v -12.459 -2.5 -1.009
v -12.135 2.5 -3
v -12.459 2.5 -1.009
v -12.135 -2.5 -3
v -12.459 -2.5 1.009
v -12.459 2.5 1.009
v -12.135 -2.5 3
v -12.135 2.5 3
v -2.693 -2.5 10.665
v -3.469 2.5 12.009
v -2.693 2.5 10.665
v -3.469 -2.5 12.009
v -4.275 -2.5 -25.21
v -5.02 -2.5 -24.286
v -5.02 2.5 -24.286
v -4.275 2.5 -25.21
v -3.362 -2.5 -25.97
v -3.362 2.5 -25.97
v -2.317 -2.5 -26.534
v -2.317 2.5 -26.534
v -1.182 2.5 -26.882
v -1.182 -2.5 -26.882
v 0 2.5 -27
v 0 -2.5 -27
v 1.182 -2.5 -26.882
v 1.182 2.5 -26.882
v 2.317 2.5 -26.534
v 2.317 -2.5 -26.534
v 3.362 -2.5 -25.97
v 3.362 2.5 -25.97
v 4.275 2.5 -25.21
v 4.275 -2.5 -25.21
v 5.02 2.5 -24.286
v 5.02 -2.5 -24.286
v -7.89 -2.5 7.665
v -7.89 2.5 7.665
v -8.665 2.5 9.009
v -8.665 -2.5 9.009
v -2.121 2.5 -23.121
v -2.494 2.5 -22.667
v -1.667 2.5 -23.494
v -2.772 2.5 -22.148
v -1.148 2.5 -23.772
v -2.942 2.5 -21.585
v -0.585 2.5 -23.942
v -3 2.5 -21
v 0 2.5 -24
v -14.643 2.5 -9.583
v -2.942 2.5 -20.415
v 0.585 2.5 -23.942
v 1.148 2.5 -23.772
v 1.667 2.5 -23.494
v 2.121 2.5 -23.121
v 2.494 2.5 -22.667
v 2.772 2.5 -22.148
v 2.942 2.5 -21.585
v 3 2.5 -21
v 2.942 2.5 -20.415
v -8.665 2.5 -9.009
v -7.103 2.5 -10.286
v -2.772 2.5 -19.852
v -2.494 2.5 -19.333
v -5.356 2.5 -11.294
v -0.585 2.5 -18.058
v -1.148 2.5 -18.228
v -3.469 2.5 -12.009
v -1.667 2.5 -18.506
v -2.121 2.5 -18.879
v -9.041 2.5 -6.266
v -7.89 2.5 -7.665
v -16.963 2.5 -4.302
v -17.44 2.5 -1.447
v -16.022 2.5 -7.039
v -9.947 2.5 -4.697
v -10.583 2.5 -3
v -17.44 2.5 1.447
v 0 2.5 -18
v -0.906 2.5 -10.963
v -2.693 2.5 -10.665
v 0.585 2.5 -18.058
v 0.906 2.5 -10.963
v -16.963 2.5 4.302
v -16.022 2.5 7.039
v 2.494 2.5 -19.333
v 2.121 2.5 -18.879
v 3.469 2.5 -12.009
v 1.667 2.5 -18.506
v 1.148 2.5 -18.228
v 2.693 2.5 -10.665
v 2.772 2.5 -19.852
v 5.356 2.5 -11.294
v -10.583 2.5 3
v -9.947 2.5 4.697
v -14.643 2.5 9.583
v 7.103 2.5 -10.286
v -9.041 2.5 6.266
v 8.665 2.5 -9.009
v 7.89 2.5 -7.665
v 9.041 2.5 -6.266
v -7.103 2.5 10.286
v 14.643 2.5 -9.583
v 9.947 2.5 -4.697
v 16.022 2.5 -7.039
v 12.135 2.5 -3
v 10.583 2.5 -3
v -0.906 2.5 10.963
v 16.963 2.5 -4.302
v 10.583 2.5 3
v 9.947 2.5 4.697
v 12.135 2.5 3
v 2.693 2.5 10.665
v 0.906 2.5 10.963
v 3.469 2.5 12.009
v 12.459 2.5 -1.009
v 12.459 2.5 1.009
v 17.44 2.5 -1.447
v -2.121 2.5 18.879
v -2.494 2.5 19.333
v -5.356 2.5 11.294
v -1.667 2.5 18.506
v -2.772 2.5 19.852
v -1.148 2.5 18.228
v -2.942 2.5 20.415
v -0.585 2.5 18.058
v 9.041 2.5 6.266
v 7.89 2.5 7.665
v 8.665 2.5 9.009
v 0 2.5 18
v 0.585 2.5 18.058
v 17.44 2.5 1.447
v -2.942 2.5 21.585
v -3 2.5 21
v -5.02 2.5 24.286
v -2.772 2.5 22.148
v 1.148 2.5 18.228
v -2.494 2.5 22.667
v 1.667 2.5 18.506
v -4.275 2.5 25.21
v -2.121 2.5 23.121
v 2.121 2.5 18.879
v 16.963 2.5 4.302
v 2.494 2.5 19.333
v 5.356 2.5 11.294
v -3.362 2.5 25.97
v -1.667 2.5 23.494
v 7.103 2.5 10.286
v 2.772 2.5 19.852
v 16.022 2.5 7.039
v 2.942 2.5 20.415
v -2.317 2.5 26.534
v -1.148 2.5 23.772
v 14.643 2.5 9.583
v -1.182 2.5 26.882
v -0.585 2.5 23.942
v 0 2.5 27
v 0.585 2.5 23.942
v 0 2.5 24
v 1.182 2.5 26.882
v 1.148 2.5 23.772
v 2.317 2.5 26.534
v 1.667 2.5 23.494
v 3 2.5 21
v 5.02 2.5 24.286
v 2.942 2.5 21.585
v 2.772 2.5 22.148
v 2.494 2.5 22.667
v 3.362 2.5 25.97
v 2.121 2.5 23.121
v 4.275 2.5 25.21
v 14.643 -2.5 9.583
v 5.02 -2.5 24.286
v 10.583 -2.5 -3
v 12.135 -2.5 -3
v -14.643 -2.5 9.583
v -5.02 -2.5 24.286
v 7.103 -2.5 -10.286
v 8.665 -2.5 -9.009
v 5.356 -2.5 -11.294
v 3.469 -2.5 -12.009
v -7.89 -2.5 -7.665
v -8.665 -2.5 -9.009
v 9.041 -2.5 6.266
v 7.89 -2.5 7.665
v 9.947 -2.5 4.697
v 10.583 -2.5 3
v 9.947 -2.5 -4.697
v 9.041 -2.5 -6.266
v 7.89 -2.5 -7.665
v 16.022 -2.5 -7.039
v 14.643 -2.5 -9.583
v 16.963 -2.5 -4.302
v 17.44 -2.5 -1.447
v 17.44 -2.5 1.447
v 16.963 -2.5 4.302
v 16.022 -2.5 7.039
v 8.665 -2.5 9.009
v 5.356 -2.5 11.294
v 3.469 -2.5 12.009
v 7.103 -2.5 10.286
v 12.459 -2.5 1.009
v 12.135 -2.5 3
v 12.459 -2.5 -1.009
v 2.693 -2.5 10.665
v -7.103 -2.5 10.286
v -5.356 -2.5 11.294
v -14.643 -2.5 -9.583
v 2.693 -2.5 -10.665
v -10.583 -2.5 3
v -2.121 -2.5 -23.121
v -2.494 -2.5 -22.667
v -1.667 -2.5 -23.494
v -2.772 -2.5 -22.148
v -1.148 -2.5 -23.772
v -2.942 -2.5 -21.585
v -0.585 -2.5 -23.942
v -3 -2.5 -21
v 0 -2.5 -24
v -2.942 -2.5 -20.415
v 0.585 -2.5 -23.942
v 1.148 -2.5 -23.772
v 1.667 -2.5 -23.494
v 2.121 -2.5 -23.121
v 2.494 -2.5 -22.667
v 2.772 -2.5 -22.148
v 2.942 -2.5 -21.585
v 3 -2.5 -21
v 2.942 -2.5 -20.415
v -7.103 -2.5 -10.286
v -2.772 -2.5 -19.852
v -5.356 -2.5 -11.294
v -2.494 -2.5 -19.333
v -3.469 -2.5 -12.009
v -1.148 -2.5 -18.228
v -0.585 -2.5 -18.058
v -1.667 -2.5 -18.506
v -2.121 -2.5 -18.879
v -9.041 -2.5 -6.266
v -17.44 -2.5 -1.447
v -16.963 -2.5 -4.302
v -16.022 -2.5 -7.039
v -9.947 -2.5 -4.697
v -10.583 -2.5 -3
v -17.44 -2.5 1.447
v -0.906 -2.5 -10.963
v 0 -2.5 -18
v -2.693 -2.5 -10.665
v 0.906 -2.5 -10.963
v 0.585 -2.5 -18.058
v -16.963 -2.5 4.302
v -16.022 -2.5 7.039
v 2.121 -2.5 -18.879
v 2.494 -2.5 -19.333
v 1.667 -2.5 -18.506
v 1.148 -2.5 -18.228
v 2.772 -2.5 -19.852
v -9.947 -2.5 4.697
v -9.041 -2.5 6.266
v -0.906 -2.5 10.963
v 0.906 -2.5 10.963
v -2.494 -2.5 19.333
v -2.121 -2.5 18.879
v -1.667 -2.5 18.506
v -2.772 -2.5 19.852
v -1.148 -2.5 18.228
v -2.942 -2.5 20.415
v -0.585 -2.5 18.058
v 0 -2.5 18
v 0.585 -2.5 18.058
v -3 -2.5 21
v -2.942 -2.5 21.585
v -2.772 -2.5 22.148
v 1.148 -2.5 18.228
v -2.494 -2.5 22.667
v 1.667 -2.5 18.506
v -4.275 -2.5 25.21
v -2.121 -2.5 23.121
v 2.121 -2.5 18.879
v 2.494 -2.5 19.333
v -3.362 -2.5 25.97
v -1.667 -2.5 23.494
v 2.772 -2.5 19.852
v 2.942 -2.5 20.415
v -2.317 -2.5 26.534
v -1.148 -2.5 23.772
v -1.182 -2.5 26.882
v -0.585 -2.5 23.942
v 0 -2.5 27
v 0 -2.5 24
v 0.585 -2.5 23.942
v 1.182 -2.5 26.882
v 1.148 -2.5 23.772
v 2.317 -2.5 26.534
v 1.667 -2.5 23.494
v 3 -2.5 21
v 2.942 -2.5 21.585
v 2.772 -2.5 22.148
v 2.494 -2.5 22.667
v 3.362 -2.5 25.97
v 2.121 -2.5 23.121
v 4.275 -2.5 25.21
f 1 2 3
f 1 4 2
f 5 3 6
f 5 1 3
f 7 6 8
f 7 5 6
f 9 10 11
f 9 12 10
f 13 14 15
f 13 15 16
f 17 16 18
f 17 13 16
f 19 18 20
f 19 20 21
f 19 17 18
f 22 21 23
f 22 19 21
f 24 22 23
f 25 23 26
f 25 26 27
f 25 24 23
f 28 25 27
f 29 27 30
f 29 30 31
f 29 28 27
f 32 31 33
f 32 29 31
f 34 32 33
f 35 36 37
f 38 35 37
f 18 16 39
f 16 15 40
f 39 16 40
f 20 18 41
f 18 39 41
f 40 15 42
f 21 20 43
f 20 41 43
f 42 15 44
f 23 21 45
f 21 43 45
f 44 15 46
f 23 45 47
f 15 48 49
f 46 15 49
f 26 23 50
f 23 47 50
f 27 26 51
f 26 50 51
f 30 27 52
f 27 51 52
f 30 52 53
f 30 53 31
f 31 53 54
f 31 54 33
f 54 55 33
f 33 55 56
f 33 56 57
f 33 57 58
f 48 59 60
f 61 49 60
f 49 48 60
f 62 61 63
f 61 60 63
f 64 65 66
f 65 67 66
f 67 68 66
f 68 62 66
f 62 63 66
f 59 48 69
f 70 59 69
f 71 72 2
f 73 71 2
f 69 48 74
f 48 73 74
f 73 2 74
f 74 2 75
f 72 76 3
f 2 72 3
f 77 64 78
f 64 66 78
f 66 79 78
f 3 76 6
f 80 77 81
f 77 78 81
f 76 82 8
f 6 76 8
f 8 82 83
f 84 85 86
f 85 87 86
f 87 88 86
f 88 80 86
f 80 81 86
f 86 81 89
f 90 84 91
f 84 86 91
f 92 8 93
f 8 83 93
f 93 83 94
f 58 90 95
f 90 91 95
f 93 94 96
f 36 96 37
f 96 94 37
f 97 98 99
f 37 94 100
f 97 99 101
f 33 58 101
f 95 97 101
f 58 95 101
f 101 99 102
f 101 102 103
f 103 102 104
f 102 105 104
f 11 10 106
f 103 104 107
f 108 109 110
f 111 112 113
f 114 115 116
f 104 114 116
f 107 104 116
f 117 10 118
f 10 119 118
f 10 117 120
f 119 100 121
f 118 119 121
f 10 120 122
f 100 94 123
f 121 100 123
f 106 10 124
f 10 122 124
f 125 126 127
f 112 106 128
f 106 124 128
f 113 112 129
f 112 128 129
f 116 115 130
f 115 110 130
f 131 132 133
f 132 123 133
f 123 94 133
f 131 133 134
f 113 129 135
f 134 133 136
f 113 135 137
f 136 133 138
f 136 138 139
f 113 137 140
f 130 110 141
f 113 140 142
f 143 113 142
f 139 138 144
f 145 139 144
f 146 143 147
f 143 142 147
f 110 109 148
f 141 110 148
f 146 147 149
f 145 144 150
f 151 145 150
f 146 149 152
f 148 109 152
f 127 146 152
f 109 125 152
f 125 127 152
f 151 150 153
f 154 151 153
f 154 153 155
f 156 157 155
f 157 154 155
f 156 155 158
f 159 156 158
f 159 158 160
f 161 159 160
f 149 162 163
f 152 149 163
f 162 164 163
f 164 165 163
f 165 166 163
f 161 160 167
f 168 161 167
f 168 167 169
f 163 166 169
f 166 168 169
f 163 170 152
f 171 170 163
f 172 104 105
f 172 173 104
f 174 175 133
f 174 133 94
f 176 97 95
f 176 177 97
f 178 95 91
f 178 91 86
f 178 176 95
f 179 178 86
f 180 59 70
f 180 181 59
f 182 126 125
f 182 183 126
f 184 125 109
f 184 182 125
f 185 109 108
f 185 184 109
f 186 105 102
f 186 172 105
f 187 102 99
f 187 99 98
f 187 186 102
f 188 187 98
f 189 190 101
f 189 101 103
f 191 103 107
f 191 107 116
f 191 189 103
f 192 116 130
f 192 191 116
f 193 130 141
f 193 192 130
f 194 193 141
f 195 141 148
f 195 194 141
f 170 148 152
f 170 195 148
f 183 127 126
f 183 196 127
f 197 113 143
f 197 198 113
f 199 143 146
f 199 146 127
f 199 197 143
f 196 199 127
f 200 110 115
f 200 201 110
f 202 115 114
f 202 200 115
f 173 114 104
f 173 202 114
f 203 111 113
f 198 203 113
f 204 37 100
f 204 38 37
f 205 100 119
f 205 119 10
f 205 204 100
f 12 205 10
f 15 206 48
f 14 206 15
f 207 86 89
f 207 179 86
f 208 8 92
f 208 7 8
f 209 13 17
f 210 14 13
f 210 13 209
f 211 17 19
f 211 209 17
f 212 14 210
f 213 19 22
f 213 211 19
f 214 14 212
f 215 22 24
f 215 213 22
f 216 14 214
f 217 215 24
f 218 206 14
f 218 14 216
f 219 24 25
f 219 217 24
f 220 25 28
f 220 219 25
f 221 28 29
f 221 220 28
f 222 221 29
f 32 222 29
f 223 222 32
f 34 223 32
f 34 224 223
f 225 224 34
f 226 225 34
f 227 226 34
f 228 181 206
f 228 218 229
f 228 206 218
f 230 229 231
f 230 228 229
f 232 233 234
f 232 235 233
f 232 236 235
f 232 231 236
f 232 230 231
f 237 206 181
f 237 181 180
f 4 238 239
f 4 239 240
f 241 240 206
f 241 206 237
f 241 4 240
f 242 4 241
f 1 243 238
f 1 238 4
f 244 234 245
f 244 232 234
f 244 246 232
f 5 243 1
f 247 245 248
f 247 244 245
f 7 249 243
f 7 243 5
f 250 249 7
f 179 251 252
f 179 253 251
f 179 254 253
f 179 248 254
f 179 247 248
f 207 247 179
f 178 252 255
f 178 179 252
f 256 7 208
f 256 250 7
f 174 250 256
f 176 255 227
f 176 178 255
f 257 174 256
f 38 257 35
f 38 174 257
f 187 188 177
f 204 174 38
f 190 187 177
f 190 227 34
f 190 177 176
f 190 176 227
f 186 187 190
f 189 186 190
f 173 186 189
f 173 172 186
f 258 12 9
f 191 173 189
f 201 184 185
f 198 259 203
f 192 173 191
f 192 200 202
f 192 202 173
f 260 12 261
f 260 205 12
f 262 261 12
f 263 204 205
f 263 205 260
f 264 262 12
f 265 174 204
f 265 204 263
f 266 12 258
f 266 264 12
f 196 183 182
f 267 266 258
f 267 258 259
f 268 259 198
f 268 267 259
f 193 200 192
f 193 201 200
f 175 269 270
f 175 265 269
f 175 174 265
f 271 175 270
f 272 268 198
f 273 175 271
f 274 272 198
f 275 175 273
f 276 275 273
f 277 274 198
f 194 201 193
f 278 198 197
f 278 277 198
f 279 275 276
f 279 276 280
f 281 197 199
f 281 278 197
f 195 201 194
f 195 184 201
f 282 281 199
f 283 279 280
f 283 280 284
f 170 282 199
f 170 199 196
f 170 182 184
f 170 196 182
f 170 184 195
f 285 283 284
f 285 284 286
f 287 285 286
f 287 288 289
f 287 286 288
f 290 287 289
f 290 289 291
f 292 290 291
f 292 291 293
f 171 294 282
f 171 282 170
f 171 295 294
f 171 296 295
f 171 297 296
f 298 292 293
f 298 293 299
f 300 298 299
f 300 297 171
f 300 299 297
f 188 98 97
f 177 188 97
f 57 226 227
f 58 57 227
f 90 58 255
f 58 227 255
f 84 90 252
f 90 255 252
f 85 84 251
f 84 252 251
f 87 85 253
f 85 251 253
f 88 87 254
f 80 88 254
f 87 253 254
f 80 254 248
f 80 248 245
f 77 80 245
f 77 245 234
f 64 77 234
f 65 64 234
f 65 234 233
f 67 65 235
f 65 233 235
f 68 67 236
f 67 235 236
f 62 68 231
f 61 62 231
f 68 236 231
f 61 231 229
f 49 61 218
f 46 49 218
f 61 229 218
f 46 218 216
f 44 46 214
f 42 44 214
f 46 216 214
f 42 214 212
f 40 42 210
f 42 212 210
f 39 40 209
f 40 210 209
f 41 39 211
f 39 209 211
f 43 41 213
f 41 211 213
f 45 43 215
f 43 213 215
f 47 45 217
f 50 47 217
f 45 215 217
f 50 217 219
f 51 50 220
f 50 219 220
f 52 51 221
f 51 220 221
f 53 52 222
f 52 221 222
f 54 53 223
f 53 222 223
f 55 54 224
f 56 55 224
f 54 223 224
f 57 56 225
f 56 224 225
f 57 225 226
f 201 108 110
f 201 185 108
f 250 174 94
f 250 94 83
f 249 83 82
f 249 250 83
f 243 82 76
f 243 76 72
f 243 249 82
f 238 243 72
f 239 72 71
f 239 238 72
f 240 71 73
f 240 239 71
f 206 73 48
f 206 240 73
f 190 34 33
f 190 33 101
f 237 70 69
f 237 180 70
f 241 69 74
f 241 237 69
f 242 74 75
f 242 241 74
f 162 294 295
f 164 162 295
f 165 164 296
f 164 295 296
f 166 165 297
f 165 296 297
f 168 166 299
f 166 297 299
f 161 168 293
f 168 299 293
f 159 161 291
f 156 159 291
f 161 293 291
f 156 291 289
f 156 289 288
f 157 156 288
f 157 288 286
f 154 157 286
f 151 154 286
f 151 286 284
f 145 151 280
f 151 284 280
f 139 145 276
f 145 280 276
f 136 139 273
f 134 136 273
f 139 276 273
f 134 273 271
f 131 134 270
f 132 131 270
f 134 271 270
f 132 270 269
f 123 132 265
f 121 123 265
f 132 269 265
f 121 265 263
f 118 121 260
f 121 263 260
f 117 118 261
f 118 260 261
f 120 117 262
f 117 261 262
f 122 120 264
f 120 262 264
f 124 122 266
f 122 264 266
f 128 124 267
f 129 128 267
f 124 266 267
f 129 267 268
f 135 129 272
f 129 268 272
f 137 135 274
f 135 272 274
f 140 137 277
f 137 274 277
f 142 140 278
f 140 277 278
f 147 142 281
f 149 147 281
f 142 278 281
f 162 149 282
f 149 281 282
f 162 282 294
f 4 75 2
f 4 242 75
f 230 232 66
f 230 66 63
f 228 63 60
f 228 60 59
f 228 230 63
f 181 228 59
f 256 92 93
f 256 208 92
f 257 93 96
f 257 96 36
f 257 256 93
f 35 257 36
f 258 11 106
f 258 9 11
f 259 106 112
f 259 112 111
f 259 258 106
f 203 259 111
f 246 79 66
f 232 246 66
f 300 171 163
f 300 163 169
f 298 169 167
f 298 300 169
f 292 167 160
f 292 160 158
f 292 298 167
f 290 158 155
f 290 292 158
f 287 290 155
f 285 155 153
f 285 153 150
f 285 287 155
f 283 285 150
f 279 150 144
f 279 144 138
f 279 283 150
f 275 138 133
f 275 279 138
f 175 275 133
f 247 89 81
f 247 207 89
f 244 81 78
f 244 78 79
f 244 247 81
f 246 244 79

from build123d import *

# Parameters (mm, degrees)
F0_R     = 17.5
F1_DEPTH = 2.5
F2_R     = 3
F3_DEPTH = 5


with BuildPart() as f1:
    # F0 (on Front) → F1 (new body, symmetric)
    with BuildSketch(Plane.XZ):
        Circle(F0_R)
        with BuildLine():
            ThreePointArc((-3.4692543384, -12.0089247785), (-6.25, -10.8253175473), (-8.6654067611, -9.0089247785))
            Line((-8.6654067611, -9.0089247785), (-7.8895788335, -7.6651513899))
            ThreePointArc((-7.8895788335, -7.6651513899), (-9.5262794416, -5.5), (-10.5830052443, -3))
            Line((-10.5830052443, -3), (-12.1346610995, -3))
            ThreePointArc((-12.1346610995, -3), (-12.5, 0), (-12.1346610995, 3))
            Line((-12.1346610995, 3), (-10.5830052443, 3))
            ThreePointArc((-10.5830052443, 3), (-9.5262794416, 5.5), (-7.8895788335, 7.6651513899))
            Line((-7.8895788335, 7.6651513899), (-8.6654067611, 9.0089247785))
            ThreePointArc((-8.6654067611, 9.0089247785), (-6.25, 10.8253175473), (-3.4692543384, 12.0089247785))
            Line((-3.4692543384, 12.0089247785), (-2.6934264108, 10.6651513899))
            ThreePointArc((-2.6934264108, 10.6651513899), (0, 11), (2.6934264108, 10.6651513899))
            Line((2.6934264108, 10.6651513899), (3.4692543384, 12.0089247785))
            ThreePointArc((3.4692543384, 12.0089247785), (6.25, 10.8253175473), (8.6654067611, 9.0089247785))
            Line((8.6654067611, 9.0089247785), (7.8895788335, 7.6651513899))
            ThreePointArc((7.8895788335, 7.6651513899), (9.5262794416, 5.5), (10.5830052443, 3))
            Line((10.5830052443, 3), (12.1346610995, 3))
            ThreePointArc((12.1346610995, 3), (12.5, 0), (12.1346610995, -3))
            Line((12.1346610995, -3), (10.5830052443, -3))
            ThreePointArc((10.5830052443, -3), (9.5262794416, -5.5), (7.8895788335, -7.6651513899))
            Line((7.8895788335, -7.6651513899), (8.6654067611, -9.0089247785))
            ThreePointArc((8.6654067611, -9.0089247785), (6.25, -10.8253175473), (3.4692543384, -12.0089247785))
            Line((3.4692543384, -12.0089247785), (2.6934264108, -10.6651513899))
            ThreePointArc((2.6934264108, -10.6651513899), (0, -11), (-2.6934264108, -10.6651513899))
            Line((-2.6934264108, -10.6651513899), (-3.4692543384, -12.0089247785))
        make_face(mode=Mode.SUBTRACT)
    extrude(amount=F1_DEPTH, both=True)

    # F2 (on face) → F3 (join, through all)
    with BuildSketch(Plane.XZ.offset(2.5)):
        with BuildLine():
            Line((-5.0203666831, 24.2857142857), (-14.642736159, 9.5833333333))
            ThreePointArc((-14.642736159, 9.5833333333), (0, 17.5), (14.642736159, 9.5833333333))
            Line((14.642736159, 9.5833333333), (5.0203666831, 24.2857142857))
            ThreePointArc((5.0203666831, 24.2857142857), (0, 27), (-5.0203666831, 24.2857142857))
        make_face()
        with Locations((0, 21)):
            Circle(F2_R, mode=Mode.SUBTRACT)
        with BuildLine():
            ThreePointArc((14.642736159, -9.5833333333), (0, -17.5), (-14.642736159, -9.5833333333))
            Line((-14.642736159, -9.5833333333), (-5.0203666831, -24.2857142857))
            ThreePointArc((-5.0203666831, -24.2857142857), (0, -27), (5.0203666831, -24.2857142857))
            Line((5.0203666831, -24.2857142857), (14.642736159, -9.5833333333))
        make_face()
        with Locations((0, -21)):
            Circle(F2_R, mode=Mode.SUBTRACT)
    extrude(amount=-F3_DEPTH)


solid = f1.part
